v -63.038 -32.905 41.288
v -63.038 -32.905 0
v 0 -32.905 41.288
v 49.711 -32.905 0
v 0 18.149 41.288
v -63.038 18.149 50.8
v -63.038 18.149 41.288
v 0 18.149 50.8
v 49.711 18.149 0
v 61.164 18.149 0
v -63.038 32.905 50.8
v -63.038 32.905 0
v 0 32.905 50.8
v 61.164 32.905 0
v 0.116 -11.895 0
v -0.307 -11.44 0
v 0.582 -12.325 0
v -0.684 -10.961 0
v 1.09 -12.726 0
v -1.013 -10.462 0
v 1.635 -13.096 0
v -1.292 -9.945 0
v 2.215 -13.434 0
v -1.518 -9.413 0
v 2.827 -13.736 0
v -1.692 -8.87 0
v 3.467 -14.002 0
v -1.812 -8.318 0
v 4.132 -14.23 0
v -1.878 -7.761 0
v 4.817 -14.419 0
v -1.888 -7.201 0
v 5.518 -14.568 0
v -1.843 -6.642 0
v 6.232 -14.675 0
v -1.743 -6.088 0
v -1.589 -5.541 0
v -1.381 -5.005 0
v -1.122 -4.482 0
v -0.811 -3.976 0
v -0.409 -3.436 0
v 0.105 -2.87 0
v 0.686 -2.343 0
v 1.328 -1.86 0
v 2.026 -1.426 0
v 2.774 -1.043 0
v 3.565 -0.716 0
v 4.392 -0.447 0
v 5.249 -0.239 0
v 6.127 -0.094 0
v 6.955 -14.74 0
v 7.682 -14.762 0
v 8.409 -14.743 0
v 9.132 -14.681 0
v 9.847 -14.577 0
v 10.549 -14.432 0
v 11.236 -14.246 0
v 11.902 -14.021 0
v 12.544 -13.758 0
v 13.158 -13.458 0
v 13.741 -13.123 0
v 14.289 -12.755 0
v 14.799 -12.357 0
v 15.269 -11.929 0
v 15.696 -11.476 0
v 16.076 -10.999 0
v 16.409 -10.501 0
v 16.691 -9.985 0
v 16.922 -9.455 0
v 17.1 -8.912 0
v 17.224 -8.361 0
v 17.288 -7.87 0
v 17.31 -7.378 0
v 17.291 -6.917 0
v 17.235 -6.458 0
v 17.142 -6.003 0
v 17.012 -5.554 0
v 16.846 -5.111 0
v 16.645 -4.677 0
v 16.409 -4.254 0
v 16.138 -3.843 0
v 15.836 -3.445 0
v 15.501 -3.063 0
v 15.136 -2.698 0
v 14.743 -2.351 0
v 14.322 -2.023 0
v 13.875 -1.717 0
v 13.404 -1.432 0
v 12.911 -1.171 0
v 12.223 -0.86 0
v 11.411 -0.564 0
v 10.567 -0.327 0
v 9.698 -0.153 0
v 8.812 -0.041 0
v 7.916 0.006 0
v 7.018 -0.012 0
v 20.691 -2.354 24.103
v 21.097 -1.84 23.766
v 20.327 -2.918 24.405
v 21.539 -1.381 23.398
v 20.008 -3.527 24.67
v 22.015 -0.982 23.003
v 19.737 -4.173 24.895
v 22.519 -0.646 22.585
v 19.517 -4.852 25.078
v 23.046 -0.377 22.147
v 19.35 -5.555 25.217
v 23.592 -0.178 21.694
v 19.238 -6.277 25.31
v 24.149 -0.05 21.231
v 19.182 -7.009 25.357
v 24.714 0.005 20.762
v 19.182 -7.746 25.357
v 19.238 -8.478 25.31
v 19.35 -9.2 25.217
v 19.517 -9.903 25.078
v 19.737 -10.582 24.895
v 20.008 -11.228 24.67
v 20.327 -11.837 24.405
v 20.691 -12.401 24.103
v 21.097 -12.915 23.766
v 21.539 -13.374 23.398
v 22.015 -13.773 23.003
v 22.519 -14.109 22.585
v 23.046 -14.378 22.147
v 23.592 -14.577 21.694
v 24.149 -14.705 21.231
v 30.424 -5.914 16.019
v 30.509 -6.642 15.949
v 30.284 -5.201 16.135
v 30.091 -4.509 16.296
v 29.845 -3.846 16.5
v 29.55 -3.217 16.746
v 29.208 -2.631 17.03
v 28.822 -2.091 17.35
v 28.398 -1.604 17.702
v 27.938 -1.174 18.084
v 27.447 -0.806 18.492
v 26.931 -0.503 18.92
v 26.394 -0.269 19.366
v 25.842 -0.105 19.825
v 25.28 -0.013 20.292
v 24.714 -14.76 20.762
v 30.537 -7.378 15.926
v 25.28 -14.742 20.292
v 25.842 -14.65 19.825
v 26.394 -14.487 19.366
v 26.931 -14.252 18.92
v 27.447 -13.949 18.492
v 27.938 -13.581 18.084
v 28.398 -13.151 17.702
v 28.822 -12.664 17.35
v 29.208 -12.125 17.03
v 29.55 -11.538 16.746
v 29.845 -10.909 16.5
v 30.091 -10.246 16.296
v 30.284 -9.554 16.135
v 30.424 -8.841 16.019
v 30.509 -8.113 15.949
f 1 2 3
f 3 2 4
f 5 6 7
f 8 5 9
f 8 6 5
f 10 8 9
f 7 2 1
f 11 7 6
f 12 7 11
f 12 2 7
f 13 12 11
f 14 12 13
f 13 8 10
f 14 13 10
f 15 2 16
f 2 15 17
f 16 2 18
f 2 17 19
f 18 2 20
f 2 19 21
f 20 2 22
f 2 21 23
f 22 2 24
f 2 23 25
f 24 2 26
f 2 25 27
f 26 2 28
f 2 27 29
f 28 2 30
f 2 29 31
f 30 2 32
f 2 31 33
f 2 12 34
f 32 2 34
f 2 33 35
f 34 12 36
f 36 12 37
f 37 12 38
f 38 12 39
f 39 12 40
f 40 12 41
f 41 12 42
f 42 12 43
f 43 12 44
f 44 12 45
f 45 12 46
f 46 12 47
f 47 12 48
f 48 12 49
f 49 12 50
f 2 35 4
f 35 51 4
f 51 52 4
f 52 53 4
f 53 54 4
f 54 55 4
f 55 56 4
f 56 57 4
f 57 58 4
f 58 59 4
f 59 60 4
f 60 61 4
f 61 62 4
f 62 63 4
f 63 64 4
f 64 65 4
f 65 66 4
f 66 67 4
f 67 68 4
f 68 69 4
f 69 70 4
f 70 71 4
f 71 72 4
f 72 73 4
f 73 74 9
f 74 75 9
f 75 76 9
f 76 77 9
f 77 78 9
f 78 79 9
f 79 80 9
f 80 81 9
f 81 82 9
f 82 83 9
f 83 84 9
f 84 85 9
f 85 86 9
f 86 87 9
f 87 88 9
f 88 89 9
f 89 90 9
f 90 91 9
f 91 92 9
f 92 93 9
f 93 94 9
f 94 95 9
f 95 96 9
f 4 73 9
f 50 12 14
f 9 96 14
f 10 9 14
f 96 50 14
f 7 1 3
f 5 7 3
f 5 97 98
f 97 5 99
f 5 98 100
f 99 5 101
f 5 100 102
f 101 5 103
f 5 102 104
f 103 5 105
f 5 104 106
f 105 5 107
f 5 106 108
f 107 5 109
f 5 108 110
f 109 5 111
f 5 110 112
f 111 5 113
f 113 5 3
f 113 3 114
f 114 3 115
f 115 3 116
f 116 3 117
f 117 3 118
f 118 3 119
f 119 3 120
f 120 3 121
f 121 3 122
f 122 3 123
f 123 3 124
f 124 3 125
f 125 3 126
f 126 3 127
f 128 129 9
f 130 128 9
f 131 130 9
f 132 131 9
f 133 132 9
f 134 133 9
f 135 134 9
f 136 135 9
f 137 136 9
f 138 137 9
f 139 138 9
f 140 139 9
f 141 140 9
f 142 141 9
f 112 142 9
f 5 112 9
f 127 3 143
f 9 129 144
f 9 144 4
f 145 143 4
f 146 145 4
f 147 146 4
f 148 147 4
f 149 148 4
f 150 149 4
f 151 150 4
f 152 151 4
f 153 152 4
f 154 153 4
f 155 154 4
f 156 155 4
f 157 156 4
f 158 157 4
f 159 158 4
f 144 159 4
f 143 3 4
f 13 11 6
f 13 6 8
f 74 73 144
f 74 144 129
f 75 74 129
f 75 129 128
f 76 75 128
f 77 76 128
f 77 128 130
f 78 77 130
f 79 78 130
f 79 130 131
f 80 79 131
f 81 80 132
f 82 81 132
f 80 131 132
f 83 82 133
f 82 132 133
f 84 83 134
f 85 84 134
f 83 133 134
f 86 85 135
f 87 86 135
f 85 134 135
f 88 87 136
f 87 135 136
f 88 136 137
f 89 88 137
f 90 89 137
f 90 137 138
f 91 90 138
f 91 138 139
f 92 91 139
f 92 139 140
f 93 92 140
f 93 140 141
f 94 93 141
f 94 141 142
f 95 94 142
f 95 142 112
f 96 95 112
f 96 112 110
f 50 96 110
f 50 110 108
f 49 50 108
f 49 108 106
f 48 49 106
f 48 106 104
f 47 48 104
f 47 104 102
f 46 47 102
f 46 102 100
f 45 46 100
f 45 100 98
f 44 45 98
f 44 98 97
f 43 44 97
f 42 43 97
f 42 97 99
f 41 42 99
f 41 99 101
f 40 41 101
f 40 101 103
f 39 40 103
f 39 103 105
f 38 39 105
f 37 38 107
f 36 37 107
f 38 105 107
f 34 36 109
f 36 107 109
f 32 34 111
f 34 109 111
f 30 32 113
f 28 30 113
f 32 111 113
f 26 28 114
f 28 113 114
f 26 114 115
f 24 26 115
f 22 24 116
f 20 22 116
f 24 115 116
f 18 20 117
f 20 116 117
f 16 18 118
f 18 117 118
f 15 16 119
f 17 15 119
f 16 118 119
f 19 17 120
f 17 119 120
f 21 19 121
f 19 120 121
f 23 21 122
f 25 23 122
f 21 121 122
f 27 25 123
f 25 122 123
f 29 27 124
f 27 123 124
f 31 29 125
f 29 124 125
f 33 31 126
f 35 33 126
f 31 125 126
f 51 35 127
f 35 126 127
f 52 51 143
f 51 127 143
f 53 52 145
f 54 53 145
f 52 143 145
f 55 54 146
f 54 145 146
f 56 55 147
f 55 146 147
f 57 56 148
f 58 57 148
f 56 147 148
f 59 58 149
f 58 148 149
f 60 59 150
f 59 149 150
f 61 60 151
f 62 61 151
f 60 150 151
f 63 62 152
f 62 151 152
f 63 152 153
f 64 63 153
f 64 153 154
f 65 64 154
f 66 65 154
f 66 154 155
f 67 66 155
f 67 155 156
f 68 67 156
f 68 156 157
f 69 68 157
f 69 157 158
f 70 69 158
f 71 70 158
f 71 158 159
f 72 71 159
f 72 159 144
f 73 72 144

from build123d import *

# Parameters (mm, degrees)
F0_W     = 126.0763704777
F0_H     = 65.8090934157
F1_DEPTH = 50.8
F3_DEPTH = 51.054
F5_DEPTH = 25.4
F6_R     = 7.3849812588
F7_DEPTH = 47.244


with BuildPart() as f1:
    # F0 (on Top) → F1 (new body)
    with BuildSketch(Plane.XY):
        Rectangle(F0_W, F0_H)
    extrude(amount=F1_DEPTH)

    # F2 (on face) → F3 (cut)
    with BuildSketch(Plane.XZ.offset(32.9045467079)):
        Polygon((63.0381852388, 50.8), (-63.0381852388, 50.8), (-63.0381852388, 41.2882640958), (0, 41.2882640958), (49.7114025056, 0), (63.0381852388, 0), align=None)
    extrude(amount=-F3_DEPTH, mode=Mode.SUBTRACT)

    # F4 (on face) → F5 (cut)
    with BuildSketch(Plane.XZ.offset(-18.1494532921)):
        Polygon((63.0381852388, 50.8), (0, 50.8), (61.1636091415, 0), (63.0381852388, 0), align=None)
    extrude(amount=-F5_DEPTH, mode=Mode.SUBTRACT)

    # F6 (on face) → F7 (cut)
    with BuildSketch(Plane(origin=(20.2933884067, 0, 24.433403084), x_dir=(0.7692697728, 0, -0.6389241087), z_dir=(0.6389241087, 0, 0.7692697728))):
        with Locations((5.9307059858, -7.3775467079)):
            Circle(F6_R)
    extrude(amount=-F7_DEPTH, mode=Mode.SUBTRACT)


solid = f1.part
